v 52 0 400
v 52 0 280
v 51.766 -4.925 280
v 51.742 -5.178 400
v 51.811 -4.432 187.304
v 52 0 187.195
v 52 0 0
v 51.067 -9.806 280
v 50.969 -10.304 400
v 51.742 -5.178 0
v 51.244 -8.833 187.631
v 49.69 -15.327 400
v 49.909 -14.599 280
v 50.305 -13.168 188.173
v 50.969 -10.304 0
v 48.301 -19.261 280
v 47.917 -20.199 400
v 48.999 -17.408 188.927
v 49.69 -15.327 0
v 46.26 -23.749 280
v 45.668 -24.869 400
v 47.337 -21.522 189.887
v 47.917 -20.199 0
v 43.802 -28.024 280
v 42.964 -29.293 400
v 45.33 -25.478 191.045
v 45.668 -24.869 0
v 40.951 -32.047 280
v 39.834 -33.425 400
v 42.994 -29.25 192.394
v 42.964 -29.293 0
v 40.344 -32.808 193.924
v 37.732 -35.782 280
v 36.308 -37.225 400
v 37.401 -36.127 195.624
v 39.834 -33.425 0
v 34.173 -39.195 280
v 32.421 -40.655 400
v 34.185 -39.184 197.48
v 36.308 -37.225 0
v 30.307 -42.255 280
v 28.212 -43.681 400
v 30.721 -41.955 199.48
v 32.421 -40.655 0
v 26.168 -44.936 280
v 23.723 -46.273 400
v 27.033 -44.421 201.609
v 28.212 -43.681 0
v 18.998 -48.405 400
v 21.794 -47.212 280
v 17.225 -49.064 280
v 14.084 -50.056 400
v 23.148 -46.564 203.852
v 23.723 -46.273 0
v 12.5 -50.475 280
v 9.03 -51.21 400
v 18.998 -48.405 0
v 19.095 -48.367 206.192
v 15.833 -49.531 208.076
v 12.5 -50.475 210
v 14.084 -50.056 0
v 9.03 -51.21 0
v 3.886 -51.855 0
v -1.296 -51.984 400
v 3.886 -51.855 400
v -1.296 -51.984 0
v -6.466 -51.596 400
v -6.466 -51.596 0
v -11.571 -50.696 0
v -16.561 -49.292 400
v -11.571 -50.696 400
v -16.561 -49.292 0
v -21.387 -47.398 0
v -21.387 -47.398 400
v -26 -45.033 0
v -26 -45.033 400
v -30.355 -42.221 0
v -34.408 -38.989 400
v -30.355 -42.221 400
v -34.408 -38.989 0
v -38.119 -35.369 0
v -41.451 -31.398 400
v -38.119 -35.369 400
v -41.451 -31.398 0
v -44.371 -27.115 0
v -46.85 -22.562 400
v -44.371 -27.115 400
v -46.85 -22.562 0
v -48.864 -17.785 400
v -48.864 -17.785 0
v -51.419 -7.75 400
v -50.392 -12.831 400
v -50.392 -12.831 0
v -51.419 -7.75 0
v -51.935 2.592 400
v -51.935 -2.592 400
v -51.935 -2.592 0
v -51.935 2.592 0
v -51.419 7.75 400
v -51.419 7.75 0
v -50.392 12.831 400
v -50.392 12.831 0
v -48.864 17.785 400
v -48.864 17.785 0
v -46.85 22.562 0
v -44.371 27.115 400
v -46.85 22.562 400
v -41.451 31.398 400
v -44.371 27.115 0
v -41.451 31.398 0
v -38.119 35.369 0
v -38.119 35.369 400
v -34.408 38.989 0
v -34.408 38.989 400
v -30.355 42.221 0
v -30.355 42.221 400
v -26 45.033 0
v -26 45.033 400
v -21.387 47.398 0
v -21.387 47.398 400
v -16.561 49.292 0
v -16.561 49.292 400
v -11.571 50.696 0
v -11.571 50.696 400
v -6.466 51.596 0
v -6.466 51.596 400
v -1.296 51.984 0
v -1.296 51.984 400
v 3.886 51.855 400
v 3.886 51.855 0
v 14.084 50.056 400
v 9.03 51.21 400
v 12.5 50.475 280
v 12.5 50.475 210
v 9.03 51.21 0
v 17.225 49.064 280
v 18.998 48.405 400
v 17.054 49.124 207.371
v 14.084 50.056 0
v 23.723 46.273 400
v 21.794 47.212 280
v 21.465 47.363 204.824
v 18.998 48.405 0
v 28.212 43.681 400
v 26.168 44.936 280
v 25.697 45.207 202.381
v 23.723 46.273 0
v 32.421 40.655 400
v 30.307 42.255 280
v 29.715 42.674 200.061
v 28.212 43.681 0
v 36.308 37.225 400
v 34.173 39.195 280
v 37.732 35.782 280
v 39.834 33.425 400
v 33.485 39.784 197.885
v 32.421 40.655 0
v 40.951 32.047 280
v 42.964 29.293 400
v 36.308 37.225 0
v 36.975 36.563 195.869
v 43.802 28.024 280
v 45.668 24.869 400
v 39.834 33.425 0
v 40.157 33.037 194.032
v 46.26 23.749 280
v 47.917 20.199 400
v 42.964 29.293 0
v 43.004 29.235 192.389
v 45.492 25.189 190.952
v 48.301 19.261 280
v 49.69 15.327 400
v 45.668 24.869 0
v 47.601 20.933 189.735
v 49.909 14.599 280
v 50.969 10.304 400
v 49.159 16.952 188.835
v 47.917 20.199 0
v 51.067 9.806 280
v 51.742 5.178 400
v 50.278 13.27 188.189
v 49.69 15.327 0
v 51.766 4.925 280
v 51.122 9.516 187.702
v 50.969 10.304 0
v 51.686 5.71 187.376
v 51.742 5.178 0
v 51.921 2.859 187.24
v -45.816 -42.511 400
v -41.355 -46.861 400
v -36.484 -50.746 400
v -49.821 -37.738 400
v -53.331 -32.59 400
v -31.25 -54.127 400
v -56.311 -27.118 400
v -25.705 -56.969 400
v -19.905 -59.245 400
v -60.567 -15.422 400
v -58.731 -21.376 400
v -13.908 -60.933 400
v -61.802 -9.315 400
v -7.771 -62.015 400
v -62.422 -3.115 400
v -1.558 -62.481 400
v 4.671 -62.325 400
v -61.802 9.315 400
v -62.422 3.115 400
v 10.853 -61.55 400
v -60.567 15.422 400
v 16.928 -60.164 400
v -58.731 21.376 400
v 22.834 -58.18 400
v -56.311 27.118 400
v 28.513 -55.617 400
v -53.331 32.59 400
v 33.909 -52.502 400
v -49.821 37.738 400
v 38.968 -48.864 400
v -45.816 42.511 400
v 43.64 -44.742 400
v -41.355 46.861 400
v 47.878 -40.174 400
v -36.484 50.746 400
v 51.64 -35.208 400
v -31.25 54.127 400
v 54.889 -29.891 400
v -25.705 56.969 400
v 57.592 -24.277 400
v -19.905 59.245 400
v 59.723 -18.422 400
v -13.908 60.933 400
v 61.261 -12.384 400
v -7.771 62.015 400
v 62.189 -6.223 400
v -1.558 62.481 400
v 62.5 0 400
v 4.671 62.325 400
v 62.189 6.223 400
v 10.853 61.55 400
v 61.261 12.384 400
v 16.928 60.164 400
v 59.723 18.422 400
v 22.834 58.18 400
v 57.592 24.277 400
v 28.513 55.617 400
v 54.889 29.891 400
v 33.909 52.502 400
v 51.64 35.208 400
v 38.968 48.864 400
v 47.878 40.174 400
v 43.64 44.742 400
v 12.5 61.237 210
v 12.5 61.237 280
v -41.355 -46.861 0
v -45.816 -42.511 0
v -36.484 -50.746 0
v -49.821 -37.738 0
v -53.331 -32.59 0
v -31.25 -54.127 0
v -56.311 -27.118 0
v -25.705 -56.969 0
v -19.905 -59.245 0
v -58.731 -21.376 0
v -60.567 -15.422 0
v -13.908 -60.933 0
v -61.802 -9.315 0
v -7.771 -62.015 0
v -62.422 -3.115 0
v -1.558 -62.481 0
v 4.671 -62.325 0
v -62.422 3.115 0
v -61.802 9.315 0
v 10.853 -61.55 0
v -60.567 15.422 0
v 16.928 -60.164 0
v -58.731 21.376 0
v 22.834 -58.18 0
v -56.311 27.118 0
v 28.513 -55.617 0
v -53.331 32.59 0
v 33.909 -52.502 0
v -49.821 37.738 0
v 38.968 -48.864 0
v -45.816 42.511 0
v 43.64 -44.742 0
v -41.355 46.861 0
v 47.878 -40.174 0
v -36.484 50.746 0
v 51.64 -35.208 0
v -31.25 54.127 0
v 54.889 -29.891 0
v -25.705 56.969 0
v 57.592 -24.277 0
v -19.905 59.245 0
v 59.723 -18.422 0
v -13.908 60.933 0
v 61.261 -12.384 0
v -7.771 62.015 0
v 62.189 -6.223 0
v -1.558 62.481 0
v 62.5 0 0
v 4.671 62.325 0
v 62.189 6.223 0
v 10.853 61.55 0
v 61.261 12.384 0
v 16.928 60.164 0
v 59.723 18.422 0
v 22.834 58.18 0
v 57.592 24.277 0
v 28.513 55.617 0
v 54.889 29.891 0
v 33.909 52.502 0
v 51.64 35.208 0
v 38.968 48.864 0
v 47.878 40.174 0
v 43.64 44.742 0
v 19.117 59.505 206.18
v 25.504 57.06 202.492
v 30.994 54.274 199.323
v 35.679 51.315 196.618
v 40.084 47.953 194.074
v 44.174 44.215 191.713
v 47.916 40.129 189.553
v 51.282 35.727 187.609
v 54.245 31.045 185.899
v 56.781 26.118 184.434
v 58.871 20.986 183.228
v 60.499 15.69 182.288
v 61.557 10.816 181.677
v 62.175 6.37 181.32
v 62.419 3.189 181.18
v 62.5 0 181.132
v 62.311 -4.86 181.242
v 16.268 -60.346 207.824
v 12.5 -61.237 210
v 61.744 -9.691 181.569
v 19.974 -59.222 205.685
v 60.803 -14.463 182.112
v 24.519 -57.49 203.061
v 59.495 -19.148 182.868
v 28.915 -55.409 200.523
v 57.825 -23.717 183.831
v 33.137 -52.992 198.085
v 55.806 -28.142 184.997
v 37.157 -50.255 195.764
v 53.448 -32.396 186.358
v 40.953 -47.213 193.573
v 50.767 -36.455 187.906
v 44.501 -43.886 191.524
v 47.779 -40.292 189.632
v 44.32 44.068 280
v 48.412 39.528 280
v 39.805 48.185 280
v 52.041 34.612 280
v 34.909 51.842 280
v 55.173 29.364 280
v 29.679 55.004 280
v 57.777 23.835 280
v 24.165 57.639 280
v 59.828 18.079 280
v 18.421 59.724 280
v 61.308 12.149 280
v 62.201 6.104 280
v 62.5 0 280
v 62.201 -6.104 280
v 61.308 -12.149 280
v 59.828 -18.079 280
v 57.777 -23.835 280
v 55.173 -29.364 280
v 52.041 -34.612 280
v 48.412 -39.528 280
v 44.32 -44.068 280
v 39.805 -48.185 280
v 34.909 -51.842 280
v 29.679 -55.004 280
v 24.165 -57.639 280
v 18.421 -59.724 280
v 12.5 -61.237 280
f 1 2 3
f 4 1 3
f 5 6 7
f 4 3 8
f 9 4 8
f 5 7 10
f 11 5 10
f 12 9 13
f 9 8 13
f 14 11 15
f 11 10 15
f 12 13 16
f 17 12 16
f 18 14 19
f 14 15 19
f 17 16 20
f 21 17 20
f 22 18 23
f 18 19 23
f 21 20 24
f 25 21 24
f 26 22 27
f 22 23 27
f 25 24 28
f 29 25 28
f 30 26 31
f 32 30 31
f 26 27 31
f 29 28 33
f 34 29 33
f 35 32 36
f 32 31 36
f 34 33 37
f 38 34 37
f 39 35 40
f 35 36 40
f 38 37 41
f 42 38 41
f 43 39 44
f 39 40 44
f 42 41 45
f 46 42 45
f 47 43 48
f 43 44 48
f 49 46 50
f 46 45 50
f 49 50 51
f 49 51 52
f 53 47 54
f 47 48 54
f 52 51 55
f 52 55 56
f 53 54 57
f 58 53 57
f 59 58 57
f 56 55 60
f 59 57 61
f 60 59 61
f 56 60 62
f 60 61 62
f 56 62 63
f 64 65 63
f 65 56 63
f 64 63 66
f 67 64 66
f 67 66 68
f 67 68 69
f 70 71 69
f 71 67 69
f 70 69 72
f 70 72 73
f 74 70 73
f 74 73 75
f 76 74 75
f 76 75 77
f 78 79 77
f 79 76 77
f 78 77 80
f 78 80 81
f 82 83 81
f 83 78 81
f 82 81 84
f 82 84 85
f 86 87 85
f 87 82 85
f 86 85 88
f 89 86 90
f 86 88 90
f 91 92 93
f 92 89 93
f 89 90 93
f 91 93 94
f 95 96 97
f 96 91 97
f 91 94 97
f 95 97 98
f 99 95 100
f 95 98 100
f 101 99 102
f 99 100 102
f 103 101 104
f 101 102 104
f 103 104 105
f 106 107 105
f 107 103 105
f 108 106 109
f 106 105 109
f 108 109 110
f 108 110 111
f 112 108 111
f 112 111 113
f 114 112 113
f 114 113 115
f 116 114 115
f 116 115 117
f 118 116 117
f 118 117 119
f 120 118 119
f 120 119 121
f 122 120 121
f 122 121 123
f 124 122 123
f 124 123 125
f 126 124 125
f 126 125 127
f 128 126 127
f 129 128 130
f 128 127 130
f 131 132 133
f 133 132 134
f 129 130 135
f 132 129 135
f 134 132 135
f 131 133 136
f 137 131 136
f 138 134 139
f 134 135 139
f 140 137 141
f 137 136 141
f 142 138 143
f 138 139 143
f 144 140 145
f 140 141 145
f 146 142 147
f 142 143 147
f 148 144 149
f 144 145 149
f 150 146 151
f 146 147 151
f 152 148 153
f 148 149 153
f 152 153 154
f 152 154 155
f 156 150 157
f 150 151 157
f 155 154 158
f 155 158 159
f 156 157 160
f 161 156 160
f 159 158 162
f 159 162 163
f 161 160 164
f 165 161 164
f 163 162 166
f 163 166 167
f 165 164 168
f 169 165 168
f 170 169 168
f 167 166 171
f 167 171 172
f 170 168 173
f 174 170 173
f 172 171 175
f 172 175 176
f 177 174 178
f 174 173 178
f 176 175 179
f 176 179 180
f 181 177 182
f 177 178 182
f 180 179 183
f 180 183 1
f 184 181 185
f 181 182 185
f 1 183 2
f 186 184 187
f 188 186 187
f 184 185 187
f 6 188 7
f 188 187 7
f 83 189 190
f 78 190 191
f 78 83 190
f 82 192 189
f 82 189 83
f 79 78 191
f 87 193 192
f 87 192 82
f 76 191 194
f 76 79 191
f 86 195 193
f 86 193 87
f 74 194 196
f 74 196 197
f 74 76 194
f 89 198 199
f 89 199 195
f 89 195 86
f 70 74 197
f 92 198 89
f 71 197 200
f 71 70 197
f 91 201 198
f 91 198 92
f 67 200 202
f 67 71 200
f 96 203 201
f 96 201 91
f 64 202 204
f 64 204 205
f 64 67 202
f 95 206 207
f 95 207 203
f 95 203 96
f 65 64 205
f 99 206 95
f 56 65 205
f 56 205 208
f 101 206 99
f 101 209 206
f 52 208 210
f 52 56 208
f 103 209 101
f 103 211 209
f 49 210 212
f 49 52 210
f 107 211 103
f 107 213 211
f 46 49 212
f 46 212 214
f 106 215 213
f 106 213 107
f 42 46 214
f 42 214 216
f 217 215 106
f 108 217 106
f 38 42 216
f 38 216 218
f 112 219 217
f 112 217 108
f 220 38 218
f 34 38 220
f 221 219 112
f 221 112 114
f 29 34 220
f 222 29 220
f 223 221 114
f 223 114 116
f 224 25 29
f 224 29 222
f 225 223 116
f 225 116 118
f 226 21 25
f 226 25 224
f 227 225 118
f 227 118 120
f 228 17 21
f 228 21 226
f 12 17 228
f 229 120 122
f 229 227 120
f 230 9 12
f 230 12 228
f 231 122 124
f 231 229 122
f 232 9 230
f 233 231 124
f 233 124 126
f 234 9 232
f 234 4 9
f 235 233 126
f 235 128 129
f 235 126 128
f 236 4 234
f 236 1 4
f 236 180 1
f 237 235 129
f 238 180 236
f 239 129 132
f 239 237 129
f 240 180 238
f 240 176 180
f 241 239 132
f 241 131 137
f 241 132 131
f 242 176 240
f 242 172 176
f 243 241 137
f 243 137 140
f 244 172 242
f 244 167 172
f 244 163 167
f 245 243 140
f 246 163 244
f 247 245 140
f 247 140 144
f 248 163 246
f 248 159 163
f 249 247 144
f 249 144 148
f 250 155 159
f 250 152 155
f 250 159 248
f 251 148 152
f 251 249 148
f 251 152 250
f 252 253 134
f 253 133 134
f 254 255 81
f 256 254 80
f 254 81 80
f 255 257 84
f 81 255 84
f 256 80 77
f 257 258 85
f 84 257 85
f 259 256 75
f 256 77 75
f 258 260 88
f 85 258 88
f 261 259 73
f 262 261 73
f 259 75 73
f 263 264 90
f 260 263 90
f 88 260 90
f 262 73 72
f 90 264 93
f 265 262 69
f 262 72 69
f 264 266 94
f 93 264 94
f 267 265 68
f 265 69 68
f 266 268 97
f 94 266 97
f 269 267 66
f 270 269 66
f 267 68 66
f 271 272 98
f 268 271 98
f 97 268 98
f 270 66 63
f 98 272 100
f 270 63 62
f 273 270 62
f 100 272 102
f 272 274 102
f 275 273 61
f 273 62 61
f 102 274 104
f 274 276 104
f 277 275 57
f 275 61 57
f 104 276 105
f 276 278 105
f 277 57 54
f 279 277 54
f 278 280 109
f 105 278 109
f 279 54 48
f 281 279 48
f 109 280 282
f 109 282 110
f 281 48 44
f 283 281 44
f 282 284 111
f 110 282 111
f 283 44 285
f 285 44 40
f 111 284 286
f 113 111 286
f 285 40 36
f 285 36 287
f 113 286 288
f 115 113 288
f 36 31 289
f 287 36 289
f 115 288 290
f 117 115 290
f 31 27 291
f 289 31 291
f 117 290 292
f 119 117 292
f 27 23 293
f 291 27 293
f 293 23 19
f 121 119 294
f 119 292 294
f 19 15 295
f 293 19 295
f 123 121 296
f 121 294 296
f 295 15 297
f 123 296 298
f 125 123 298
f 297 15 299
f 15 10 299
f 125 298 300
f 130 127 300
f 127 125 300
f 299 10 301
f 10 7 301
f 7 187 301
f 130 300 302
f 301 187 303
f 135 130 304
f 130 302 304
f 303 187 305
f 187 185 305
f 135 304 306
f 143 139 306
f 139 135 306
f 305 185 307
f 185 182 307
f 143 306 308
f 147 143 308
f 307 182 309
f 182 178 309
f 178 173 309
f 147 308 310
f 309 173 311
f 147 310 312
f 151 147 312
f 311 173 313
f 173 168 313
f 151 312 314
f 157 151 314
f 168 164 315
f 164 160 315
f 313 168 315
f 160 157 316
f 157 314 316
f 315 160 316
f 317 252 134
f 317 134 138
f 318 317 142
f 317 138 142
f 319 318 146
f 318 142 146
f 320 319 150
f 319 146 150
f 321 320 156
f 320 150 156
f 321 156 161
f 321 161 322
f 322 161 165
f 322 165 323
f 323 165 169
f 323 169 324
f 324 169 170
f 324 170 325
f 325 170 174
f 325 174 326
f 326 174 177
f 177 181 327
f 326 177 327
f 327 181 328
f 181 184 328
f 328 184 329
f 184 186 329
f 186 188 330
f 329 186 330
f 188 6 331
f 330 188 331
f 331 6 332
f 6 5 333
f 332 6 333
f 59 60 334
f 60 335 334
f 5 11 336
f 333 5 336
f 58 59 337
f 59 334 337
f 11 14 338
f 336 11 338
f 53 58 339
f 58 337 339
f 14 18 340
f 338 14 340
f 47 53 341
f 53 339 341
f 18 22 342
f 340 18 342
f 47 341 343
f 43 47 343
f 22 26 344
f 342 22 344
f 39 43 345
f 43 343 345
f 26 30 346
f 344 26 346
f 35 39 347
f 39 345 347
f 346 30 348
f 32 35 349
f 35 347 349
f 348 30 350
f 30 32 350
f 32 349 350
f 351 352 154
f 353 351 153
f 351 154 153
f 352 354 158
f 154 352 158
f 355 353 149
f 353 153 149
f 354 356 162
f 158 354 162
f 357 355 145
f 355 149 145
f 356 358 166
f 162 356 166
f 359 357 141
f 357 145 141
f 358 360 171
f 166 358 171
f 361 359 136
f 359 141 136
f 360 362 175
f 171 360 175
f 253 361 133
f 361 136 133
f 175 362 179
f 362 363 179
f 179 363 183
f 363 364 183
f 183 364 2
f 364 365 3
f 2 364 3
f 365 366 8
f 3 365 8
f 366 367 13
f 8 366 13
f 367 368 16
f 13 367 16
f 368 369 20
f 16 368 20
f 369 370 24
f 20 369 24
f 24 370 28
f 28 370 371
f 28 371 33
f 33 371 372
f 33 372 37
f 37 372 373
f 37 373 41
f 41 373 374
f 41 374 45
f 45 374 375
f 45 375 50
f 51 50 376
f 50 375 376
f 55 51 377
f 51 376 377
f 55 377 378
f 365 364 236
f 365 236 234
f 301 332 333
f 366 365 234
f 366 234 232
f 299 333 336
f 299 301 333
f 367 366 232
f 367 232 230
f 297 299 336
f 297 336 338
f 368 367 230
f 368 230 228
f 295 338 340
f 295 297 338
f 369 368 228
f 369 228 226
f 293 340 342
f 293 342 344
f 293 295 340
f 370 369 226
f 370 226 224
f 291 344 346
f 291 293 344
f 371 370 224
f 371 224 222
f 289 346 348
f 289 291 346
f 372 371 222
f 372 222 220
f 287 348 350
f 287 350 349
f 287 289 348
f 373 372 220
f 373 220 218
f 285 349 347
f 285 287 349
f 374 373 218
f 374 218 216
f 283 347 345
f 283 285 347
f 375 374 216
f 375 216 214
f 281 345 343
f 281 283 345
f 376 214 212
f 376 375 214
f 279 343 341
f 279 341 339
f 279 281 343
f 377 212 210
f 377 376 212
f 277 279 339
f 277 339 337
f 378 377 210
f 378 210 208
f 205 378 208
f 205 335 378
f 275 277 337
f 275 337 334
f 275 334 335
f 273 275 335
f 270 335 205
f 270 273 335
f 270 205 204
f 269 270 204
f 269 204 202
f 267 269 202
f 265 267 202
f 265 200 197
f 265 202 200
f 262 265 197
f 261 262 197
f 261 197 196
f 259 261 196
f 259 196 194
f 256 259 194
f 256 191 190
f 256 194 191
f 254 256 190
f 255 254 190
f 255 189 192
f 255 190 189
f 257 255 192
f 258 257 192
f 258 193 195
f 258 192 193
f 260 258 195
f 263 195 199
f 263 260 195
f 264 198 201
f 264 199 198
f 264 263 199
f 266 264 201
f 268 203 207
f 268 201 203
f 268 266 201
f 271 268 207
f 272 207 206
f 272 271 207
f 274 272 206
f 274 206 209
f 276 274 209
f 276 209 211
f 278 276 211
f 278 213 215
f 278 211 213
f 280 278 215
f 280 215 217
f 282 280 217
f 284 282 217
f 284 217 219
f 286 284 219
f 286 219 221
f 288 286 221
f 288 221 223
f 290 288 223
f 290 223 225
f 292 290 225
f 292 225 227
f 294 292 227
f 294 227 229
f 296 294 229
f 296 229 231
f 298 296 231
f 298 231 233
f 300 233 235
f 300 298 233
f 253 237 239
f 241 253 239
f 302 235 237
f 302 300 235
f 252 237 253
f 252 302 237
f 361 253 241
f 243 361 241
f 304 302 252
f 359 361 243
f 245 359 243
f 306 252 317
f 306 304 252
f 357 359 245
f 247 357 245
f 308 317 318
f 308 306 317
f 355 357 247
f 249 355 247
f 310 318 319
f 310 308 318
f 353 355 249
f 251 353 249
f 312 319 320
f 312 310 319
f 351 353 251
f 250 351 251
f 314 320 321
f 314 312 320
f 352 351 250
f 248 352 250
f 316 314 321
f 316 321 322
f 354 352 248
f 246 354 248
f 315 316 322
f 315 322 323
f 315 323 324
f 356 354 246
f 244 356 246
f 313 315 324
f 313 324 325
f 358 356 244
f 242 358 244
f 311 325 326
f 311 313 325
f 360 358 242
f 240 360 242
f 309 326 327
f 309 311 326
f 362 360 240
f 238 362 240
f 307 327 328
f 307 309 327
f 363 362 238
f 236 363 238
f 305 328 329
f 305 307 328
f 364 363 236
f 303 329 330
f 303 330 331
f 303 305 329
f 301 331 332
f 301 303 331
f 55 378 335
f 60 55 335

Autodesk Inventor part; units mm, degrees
ref_plane "YZ Plane" through (0, 0, 0) normal (1, 0, 0) x (0, 1, 0)
ref_plane "XZ Plane" through (0, 0, 0) normal (0, 1, 0) x (-1, 0, 0)
ref_plane "XY Plane" through (0, 0, 0) normal (0, 0, 1) x (1, 0, 0)
sketch "Sketch1" plane through (0, 0, 0) normal (0, 0, 1) x (1, 0, 0)
  circle A0 centre (0, 0) radius 52
  circle A1 centre (0, 0) radius 62.5
  dimension "d0" = 125
  dimension "d1" = 104
extrude "Extrusion1" add sketch "Sketch1" along normal blind 400
sketch "Sketch2" plane through (0, 0, 0) normal (0, 1, 0) x (-1, 0, 0)
  line L0 (62.5, 400) -> (-62.5, 400) projected
  line L1 (62.5, 0) -> (-62.5, 0) projected
  line L2 (-62.5, 280) -> (-12.5, 280)
  line L3 (-12.5, 280) -> (-12.5, 210)
  line L4 (-12.5, 210) -> (-62.5, 181.1325)
  line L5 (-62.5, 0) -> (-62.5, 400) projected
  point P0 (0, 0)
  dimension "d4" = 60
  dimension "d5" = 50
  dimension "d6" = 120
  dimension "d7" = 70
extrude "Extrusion2" cut sketch "Sketch2" along normal through all both and the other way through all
properties part number "NVPH-341 second tube"
